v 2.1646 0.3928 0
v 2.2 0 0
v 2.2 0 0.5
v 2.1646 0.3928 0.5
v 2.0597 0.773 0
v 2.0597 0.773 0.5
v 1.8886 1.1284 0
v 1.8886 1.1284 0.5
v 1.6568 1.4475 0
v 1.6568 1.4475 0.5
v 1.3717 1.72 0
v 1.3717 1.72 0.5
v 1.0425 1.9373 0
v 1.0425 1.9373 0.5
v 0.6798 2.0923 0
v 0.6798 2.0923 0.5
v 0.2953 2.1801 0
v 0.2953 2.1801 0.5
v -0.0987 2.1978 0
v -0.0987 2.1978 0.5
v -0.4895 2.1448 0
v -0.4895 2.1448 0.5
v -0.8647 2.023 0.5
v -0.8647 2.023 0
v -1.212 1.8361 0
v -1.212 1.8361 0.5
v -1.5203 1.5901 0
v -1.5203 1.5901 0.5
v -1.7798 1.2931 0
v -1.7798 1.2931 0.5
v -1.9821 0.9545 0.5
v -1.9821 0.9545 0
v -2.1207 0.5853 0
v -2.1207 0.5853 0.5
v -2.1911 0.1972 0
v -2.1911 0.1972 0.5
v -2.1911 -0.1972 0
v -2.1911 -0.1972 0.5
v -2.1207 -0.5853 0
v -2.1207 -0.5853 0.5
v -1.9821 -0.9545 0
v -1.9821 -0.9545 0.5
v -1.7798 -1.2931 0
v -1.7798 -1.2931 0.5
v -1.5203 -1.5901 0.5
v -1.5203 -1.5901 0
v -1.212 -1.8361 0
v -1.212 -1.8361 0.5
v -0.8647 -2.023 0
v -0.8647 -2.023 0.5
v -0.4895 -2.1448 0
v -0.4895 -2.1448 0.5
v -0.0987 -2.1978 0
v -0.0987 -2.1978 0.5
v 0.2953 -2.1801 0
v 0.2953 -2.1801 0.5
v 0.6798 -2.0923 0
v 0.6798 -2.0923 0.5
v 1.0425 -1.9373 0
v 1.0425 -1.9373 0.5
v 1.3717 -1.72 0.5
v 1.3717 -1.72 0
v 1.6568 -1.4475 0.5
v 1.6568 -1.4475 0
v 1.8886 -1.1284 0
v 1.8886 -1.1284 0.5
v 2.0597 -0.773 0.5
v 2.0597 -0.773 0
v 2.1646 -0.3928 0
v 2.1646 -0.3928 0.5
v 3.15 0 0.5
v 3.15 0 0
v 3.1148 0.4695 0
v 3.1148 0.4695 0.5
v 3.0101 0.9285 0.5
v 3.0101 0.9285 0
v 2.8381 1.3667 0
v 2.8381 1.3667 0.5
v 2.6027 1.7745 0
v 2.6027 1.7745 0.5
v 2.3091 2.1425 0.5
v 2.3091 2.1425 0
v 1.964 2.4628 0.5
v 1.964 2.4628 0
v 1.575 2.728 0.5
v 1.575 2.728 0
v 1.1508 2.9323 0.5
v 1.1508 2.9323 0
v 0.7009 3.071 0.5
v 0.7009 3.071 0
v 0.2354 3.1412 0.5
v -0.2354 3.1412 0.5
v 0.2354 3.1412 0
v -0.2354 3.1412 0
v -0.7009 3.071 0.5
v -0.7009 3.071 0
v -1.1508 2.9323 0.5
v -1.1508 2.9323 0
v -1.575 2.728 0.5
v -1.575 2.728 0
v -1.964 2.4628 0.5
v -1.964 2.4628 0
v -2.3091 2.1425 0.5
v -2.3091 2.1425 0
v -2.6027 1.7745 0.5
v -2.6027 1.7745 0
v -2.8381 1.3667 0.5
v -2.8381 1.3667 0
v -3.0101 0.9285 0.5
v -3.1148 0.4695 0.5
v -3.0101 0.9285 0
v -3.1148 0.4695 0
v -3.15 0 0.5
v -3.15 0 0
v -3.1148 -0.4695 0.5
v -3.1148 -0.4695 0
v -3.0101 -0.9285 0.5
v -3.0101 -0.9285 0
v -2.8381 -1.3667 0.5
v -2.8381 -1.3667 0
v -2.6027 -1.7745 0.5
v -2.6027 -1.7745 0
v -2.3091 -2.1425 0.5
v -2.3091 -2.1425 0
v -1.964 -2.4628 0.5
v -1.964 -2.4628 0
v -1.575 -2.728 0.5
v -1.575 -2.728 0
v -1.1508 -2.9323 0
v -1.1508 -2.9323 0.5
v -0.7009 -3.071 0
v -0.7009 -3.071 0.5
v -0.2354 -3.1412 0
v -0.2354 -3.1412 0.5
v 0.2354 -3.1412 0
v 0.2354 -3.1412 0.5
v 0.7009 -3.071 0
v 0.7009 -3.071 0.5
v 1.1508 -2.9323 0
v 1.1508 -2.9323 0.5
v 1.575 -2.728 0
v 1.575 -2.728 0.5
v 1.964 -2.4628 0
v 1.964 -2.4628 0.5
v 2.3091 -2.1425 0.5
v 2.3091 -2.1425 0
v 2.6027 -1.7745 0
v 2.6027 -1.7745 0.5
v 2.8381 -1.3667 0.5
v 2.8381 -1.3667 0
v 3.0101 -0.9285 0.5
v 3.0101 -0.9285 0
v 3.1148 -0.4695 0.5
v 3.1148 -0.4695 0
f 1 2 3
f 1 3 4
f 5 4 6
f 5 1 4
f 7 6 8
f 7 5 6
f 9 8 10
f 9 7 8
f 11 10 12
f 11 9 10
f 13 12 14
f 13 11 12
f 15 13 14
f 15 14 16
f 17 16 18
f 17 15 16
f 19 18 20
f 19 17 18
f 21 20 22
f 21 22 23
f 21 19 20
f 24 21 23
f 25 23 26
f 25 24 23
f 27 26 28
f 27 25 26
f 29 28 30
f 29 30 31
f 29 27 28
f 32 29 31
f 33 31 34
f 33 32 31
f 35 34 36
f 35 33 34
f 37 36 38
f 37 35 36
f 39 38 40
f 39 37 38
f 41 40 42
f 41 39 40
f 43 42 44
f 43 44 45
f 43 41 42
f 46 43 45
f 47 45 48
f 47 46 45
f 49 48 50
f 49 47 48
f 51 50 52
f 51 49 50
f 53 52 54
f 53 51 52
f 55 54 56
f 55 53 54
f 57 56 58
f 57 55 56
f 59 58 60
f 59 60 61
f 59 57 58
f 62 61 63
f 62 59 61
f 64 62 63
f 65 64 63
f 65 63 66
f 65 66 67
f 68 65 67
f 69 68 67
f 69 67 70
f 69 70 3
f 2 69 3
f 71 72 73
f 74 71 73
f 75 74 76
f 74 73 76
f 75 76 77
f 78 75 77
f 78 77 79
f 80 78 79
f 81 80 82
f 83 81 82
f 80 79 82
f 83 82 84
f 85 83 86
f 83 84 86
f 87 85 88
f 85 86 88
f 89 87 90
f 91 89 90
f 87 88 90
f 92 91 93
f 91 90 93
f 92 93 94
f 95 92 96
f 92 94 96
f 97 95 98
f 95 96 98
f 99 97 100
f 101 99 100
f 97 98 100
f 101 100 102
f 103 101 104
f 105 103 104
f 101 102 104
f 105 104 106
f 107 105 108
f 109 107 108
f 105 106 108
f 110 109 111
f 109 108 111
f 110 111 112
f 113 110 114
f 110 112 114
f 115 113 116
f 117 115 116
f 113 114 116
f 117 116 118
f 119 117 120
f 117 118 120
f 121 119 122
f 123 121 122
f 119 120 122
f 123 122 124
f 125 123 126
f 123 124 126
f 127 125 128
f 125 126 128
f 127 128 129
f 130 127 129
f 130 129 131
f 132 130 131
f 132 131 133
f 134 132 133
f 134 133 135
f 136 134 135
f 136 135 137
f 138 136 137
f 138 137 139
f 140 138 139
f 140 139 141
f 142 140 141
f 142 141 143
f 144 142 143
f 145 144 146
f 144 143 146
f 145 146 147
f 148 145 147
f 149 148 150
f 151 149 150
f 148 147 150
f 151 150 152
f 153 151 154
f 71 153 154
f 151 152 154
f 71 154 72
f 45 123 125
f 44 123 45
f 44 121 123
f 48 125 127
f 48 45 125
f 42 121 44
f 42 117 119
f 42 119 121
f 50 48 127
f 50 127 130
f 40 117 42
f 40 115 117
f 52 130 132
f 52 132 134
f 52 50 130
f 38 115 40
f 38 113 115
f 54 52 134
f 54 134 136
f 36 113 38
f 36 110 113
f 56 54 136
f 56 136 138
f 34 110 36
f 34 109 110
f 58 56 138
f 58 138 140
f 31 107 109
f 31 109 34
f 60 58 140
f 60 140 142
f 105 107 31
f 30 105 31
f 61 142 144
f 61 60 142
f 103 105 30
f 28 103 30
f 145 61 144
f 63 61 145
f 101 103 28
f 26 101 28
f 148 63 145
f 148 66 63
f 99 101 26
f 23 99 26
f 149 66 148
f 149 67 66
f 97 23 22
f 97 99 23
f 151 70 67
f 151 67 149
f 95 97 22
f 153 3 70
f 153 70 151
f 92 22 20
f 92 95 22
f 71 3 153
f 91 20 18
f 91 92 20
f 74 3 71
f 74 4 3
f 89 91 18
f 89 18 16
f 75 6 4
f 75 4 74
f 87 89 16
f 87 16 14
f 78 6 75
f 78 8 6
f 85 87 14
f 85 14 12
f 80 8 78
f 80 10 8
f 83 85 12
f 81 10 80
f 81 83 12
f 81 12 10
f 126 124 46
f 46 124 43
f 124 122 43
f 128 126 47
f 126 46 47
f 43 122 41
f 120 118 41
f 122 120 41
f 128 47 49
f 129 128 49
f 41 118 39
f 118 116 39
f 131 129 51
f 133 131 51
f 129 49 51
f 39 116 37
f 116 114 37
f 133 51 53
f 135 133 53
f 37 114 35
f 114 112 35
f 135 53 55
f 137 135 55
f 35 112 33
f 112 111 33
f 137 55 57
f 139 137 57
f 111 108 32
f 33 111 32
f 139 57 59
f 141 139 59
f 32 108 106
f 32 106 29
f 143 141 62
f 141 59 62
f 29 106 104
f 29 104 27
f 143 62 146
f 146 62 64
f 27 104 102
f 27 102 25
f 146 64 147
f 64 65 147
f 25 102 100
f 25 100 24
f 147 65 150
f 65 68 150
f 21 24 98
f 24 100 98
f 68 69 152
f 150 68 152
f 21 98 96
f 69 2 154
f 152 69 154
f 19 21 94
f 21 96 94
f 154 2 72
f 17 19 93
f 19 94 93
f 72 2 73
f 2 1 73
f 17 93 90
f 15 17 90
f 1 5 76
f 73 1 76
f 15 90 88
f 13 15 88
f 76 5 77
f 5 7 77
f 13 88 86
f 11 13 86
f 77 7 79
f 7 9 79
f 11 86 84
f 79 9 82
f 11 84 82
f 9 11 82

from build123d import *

# Parameters (mm, degrees)
CYLINDER022_R     = 2.2
CYLINDER022_DEPTH = 0.5
CYLINDER021_R     = 3.15
CYLINDER021_DEPTH = 0.5


with BuildPart() as cylinder022:
    # Cylinder022 → Cylinder022 (new body)
    with BuildSketch(Plane.XY):
        Circle(CYLINDER022_R)
    extrude(amount=CYLINDER022_DEPTH)


with BuildPart() as f_0p5_spacer:
    # Cylinder021 → Cylinder021 (new body)
    with BuildSketch(Plane.XY):
        Circle(CYLINDER021_R)
    extrude(amount=CYLINDER021_DEPTH)

    # Cut001021: cut Cylinder022
    add(cylinder022.part, mode=Mode.SUBTRACT)


solid = f_0p5_spacer.part
